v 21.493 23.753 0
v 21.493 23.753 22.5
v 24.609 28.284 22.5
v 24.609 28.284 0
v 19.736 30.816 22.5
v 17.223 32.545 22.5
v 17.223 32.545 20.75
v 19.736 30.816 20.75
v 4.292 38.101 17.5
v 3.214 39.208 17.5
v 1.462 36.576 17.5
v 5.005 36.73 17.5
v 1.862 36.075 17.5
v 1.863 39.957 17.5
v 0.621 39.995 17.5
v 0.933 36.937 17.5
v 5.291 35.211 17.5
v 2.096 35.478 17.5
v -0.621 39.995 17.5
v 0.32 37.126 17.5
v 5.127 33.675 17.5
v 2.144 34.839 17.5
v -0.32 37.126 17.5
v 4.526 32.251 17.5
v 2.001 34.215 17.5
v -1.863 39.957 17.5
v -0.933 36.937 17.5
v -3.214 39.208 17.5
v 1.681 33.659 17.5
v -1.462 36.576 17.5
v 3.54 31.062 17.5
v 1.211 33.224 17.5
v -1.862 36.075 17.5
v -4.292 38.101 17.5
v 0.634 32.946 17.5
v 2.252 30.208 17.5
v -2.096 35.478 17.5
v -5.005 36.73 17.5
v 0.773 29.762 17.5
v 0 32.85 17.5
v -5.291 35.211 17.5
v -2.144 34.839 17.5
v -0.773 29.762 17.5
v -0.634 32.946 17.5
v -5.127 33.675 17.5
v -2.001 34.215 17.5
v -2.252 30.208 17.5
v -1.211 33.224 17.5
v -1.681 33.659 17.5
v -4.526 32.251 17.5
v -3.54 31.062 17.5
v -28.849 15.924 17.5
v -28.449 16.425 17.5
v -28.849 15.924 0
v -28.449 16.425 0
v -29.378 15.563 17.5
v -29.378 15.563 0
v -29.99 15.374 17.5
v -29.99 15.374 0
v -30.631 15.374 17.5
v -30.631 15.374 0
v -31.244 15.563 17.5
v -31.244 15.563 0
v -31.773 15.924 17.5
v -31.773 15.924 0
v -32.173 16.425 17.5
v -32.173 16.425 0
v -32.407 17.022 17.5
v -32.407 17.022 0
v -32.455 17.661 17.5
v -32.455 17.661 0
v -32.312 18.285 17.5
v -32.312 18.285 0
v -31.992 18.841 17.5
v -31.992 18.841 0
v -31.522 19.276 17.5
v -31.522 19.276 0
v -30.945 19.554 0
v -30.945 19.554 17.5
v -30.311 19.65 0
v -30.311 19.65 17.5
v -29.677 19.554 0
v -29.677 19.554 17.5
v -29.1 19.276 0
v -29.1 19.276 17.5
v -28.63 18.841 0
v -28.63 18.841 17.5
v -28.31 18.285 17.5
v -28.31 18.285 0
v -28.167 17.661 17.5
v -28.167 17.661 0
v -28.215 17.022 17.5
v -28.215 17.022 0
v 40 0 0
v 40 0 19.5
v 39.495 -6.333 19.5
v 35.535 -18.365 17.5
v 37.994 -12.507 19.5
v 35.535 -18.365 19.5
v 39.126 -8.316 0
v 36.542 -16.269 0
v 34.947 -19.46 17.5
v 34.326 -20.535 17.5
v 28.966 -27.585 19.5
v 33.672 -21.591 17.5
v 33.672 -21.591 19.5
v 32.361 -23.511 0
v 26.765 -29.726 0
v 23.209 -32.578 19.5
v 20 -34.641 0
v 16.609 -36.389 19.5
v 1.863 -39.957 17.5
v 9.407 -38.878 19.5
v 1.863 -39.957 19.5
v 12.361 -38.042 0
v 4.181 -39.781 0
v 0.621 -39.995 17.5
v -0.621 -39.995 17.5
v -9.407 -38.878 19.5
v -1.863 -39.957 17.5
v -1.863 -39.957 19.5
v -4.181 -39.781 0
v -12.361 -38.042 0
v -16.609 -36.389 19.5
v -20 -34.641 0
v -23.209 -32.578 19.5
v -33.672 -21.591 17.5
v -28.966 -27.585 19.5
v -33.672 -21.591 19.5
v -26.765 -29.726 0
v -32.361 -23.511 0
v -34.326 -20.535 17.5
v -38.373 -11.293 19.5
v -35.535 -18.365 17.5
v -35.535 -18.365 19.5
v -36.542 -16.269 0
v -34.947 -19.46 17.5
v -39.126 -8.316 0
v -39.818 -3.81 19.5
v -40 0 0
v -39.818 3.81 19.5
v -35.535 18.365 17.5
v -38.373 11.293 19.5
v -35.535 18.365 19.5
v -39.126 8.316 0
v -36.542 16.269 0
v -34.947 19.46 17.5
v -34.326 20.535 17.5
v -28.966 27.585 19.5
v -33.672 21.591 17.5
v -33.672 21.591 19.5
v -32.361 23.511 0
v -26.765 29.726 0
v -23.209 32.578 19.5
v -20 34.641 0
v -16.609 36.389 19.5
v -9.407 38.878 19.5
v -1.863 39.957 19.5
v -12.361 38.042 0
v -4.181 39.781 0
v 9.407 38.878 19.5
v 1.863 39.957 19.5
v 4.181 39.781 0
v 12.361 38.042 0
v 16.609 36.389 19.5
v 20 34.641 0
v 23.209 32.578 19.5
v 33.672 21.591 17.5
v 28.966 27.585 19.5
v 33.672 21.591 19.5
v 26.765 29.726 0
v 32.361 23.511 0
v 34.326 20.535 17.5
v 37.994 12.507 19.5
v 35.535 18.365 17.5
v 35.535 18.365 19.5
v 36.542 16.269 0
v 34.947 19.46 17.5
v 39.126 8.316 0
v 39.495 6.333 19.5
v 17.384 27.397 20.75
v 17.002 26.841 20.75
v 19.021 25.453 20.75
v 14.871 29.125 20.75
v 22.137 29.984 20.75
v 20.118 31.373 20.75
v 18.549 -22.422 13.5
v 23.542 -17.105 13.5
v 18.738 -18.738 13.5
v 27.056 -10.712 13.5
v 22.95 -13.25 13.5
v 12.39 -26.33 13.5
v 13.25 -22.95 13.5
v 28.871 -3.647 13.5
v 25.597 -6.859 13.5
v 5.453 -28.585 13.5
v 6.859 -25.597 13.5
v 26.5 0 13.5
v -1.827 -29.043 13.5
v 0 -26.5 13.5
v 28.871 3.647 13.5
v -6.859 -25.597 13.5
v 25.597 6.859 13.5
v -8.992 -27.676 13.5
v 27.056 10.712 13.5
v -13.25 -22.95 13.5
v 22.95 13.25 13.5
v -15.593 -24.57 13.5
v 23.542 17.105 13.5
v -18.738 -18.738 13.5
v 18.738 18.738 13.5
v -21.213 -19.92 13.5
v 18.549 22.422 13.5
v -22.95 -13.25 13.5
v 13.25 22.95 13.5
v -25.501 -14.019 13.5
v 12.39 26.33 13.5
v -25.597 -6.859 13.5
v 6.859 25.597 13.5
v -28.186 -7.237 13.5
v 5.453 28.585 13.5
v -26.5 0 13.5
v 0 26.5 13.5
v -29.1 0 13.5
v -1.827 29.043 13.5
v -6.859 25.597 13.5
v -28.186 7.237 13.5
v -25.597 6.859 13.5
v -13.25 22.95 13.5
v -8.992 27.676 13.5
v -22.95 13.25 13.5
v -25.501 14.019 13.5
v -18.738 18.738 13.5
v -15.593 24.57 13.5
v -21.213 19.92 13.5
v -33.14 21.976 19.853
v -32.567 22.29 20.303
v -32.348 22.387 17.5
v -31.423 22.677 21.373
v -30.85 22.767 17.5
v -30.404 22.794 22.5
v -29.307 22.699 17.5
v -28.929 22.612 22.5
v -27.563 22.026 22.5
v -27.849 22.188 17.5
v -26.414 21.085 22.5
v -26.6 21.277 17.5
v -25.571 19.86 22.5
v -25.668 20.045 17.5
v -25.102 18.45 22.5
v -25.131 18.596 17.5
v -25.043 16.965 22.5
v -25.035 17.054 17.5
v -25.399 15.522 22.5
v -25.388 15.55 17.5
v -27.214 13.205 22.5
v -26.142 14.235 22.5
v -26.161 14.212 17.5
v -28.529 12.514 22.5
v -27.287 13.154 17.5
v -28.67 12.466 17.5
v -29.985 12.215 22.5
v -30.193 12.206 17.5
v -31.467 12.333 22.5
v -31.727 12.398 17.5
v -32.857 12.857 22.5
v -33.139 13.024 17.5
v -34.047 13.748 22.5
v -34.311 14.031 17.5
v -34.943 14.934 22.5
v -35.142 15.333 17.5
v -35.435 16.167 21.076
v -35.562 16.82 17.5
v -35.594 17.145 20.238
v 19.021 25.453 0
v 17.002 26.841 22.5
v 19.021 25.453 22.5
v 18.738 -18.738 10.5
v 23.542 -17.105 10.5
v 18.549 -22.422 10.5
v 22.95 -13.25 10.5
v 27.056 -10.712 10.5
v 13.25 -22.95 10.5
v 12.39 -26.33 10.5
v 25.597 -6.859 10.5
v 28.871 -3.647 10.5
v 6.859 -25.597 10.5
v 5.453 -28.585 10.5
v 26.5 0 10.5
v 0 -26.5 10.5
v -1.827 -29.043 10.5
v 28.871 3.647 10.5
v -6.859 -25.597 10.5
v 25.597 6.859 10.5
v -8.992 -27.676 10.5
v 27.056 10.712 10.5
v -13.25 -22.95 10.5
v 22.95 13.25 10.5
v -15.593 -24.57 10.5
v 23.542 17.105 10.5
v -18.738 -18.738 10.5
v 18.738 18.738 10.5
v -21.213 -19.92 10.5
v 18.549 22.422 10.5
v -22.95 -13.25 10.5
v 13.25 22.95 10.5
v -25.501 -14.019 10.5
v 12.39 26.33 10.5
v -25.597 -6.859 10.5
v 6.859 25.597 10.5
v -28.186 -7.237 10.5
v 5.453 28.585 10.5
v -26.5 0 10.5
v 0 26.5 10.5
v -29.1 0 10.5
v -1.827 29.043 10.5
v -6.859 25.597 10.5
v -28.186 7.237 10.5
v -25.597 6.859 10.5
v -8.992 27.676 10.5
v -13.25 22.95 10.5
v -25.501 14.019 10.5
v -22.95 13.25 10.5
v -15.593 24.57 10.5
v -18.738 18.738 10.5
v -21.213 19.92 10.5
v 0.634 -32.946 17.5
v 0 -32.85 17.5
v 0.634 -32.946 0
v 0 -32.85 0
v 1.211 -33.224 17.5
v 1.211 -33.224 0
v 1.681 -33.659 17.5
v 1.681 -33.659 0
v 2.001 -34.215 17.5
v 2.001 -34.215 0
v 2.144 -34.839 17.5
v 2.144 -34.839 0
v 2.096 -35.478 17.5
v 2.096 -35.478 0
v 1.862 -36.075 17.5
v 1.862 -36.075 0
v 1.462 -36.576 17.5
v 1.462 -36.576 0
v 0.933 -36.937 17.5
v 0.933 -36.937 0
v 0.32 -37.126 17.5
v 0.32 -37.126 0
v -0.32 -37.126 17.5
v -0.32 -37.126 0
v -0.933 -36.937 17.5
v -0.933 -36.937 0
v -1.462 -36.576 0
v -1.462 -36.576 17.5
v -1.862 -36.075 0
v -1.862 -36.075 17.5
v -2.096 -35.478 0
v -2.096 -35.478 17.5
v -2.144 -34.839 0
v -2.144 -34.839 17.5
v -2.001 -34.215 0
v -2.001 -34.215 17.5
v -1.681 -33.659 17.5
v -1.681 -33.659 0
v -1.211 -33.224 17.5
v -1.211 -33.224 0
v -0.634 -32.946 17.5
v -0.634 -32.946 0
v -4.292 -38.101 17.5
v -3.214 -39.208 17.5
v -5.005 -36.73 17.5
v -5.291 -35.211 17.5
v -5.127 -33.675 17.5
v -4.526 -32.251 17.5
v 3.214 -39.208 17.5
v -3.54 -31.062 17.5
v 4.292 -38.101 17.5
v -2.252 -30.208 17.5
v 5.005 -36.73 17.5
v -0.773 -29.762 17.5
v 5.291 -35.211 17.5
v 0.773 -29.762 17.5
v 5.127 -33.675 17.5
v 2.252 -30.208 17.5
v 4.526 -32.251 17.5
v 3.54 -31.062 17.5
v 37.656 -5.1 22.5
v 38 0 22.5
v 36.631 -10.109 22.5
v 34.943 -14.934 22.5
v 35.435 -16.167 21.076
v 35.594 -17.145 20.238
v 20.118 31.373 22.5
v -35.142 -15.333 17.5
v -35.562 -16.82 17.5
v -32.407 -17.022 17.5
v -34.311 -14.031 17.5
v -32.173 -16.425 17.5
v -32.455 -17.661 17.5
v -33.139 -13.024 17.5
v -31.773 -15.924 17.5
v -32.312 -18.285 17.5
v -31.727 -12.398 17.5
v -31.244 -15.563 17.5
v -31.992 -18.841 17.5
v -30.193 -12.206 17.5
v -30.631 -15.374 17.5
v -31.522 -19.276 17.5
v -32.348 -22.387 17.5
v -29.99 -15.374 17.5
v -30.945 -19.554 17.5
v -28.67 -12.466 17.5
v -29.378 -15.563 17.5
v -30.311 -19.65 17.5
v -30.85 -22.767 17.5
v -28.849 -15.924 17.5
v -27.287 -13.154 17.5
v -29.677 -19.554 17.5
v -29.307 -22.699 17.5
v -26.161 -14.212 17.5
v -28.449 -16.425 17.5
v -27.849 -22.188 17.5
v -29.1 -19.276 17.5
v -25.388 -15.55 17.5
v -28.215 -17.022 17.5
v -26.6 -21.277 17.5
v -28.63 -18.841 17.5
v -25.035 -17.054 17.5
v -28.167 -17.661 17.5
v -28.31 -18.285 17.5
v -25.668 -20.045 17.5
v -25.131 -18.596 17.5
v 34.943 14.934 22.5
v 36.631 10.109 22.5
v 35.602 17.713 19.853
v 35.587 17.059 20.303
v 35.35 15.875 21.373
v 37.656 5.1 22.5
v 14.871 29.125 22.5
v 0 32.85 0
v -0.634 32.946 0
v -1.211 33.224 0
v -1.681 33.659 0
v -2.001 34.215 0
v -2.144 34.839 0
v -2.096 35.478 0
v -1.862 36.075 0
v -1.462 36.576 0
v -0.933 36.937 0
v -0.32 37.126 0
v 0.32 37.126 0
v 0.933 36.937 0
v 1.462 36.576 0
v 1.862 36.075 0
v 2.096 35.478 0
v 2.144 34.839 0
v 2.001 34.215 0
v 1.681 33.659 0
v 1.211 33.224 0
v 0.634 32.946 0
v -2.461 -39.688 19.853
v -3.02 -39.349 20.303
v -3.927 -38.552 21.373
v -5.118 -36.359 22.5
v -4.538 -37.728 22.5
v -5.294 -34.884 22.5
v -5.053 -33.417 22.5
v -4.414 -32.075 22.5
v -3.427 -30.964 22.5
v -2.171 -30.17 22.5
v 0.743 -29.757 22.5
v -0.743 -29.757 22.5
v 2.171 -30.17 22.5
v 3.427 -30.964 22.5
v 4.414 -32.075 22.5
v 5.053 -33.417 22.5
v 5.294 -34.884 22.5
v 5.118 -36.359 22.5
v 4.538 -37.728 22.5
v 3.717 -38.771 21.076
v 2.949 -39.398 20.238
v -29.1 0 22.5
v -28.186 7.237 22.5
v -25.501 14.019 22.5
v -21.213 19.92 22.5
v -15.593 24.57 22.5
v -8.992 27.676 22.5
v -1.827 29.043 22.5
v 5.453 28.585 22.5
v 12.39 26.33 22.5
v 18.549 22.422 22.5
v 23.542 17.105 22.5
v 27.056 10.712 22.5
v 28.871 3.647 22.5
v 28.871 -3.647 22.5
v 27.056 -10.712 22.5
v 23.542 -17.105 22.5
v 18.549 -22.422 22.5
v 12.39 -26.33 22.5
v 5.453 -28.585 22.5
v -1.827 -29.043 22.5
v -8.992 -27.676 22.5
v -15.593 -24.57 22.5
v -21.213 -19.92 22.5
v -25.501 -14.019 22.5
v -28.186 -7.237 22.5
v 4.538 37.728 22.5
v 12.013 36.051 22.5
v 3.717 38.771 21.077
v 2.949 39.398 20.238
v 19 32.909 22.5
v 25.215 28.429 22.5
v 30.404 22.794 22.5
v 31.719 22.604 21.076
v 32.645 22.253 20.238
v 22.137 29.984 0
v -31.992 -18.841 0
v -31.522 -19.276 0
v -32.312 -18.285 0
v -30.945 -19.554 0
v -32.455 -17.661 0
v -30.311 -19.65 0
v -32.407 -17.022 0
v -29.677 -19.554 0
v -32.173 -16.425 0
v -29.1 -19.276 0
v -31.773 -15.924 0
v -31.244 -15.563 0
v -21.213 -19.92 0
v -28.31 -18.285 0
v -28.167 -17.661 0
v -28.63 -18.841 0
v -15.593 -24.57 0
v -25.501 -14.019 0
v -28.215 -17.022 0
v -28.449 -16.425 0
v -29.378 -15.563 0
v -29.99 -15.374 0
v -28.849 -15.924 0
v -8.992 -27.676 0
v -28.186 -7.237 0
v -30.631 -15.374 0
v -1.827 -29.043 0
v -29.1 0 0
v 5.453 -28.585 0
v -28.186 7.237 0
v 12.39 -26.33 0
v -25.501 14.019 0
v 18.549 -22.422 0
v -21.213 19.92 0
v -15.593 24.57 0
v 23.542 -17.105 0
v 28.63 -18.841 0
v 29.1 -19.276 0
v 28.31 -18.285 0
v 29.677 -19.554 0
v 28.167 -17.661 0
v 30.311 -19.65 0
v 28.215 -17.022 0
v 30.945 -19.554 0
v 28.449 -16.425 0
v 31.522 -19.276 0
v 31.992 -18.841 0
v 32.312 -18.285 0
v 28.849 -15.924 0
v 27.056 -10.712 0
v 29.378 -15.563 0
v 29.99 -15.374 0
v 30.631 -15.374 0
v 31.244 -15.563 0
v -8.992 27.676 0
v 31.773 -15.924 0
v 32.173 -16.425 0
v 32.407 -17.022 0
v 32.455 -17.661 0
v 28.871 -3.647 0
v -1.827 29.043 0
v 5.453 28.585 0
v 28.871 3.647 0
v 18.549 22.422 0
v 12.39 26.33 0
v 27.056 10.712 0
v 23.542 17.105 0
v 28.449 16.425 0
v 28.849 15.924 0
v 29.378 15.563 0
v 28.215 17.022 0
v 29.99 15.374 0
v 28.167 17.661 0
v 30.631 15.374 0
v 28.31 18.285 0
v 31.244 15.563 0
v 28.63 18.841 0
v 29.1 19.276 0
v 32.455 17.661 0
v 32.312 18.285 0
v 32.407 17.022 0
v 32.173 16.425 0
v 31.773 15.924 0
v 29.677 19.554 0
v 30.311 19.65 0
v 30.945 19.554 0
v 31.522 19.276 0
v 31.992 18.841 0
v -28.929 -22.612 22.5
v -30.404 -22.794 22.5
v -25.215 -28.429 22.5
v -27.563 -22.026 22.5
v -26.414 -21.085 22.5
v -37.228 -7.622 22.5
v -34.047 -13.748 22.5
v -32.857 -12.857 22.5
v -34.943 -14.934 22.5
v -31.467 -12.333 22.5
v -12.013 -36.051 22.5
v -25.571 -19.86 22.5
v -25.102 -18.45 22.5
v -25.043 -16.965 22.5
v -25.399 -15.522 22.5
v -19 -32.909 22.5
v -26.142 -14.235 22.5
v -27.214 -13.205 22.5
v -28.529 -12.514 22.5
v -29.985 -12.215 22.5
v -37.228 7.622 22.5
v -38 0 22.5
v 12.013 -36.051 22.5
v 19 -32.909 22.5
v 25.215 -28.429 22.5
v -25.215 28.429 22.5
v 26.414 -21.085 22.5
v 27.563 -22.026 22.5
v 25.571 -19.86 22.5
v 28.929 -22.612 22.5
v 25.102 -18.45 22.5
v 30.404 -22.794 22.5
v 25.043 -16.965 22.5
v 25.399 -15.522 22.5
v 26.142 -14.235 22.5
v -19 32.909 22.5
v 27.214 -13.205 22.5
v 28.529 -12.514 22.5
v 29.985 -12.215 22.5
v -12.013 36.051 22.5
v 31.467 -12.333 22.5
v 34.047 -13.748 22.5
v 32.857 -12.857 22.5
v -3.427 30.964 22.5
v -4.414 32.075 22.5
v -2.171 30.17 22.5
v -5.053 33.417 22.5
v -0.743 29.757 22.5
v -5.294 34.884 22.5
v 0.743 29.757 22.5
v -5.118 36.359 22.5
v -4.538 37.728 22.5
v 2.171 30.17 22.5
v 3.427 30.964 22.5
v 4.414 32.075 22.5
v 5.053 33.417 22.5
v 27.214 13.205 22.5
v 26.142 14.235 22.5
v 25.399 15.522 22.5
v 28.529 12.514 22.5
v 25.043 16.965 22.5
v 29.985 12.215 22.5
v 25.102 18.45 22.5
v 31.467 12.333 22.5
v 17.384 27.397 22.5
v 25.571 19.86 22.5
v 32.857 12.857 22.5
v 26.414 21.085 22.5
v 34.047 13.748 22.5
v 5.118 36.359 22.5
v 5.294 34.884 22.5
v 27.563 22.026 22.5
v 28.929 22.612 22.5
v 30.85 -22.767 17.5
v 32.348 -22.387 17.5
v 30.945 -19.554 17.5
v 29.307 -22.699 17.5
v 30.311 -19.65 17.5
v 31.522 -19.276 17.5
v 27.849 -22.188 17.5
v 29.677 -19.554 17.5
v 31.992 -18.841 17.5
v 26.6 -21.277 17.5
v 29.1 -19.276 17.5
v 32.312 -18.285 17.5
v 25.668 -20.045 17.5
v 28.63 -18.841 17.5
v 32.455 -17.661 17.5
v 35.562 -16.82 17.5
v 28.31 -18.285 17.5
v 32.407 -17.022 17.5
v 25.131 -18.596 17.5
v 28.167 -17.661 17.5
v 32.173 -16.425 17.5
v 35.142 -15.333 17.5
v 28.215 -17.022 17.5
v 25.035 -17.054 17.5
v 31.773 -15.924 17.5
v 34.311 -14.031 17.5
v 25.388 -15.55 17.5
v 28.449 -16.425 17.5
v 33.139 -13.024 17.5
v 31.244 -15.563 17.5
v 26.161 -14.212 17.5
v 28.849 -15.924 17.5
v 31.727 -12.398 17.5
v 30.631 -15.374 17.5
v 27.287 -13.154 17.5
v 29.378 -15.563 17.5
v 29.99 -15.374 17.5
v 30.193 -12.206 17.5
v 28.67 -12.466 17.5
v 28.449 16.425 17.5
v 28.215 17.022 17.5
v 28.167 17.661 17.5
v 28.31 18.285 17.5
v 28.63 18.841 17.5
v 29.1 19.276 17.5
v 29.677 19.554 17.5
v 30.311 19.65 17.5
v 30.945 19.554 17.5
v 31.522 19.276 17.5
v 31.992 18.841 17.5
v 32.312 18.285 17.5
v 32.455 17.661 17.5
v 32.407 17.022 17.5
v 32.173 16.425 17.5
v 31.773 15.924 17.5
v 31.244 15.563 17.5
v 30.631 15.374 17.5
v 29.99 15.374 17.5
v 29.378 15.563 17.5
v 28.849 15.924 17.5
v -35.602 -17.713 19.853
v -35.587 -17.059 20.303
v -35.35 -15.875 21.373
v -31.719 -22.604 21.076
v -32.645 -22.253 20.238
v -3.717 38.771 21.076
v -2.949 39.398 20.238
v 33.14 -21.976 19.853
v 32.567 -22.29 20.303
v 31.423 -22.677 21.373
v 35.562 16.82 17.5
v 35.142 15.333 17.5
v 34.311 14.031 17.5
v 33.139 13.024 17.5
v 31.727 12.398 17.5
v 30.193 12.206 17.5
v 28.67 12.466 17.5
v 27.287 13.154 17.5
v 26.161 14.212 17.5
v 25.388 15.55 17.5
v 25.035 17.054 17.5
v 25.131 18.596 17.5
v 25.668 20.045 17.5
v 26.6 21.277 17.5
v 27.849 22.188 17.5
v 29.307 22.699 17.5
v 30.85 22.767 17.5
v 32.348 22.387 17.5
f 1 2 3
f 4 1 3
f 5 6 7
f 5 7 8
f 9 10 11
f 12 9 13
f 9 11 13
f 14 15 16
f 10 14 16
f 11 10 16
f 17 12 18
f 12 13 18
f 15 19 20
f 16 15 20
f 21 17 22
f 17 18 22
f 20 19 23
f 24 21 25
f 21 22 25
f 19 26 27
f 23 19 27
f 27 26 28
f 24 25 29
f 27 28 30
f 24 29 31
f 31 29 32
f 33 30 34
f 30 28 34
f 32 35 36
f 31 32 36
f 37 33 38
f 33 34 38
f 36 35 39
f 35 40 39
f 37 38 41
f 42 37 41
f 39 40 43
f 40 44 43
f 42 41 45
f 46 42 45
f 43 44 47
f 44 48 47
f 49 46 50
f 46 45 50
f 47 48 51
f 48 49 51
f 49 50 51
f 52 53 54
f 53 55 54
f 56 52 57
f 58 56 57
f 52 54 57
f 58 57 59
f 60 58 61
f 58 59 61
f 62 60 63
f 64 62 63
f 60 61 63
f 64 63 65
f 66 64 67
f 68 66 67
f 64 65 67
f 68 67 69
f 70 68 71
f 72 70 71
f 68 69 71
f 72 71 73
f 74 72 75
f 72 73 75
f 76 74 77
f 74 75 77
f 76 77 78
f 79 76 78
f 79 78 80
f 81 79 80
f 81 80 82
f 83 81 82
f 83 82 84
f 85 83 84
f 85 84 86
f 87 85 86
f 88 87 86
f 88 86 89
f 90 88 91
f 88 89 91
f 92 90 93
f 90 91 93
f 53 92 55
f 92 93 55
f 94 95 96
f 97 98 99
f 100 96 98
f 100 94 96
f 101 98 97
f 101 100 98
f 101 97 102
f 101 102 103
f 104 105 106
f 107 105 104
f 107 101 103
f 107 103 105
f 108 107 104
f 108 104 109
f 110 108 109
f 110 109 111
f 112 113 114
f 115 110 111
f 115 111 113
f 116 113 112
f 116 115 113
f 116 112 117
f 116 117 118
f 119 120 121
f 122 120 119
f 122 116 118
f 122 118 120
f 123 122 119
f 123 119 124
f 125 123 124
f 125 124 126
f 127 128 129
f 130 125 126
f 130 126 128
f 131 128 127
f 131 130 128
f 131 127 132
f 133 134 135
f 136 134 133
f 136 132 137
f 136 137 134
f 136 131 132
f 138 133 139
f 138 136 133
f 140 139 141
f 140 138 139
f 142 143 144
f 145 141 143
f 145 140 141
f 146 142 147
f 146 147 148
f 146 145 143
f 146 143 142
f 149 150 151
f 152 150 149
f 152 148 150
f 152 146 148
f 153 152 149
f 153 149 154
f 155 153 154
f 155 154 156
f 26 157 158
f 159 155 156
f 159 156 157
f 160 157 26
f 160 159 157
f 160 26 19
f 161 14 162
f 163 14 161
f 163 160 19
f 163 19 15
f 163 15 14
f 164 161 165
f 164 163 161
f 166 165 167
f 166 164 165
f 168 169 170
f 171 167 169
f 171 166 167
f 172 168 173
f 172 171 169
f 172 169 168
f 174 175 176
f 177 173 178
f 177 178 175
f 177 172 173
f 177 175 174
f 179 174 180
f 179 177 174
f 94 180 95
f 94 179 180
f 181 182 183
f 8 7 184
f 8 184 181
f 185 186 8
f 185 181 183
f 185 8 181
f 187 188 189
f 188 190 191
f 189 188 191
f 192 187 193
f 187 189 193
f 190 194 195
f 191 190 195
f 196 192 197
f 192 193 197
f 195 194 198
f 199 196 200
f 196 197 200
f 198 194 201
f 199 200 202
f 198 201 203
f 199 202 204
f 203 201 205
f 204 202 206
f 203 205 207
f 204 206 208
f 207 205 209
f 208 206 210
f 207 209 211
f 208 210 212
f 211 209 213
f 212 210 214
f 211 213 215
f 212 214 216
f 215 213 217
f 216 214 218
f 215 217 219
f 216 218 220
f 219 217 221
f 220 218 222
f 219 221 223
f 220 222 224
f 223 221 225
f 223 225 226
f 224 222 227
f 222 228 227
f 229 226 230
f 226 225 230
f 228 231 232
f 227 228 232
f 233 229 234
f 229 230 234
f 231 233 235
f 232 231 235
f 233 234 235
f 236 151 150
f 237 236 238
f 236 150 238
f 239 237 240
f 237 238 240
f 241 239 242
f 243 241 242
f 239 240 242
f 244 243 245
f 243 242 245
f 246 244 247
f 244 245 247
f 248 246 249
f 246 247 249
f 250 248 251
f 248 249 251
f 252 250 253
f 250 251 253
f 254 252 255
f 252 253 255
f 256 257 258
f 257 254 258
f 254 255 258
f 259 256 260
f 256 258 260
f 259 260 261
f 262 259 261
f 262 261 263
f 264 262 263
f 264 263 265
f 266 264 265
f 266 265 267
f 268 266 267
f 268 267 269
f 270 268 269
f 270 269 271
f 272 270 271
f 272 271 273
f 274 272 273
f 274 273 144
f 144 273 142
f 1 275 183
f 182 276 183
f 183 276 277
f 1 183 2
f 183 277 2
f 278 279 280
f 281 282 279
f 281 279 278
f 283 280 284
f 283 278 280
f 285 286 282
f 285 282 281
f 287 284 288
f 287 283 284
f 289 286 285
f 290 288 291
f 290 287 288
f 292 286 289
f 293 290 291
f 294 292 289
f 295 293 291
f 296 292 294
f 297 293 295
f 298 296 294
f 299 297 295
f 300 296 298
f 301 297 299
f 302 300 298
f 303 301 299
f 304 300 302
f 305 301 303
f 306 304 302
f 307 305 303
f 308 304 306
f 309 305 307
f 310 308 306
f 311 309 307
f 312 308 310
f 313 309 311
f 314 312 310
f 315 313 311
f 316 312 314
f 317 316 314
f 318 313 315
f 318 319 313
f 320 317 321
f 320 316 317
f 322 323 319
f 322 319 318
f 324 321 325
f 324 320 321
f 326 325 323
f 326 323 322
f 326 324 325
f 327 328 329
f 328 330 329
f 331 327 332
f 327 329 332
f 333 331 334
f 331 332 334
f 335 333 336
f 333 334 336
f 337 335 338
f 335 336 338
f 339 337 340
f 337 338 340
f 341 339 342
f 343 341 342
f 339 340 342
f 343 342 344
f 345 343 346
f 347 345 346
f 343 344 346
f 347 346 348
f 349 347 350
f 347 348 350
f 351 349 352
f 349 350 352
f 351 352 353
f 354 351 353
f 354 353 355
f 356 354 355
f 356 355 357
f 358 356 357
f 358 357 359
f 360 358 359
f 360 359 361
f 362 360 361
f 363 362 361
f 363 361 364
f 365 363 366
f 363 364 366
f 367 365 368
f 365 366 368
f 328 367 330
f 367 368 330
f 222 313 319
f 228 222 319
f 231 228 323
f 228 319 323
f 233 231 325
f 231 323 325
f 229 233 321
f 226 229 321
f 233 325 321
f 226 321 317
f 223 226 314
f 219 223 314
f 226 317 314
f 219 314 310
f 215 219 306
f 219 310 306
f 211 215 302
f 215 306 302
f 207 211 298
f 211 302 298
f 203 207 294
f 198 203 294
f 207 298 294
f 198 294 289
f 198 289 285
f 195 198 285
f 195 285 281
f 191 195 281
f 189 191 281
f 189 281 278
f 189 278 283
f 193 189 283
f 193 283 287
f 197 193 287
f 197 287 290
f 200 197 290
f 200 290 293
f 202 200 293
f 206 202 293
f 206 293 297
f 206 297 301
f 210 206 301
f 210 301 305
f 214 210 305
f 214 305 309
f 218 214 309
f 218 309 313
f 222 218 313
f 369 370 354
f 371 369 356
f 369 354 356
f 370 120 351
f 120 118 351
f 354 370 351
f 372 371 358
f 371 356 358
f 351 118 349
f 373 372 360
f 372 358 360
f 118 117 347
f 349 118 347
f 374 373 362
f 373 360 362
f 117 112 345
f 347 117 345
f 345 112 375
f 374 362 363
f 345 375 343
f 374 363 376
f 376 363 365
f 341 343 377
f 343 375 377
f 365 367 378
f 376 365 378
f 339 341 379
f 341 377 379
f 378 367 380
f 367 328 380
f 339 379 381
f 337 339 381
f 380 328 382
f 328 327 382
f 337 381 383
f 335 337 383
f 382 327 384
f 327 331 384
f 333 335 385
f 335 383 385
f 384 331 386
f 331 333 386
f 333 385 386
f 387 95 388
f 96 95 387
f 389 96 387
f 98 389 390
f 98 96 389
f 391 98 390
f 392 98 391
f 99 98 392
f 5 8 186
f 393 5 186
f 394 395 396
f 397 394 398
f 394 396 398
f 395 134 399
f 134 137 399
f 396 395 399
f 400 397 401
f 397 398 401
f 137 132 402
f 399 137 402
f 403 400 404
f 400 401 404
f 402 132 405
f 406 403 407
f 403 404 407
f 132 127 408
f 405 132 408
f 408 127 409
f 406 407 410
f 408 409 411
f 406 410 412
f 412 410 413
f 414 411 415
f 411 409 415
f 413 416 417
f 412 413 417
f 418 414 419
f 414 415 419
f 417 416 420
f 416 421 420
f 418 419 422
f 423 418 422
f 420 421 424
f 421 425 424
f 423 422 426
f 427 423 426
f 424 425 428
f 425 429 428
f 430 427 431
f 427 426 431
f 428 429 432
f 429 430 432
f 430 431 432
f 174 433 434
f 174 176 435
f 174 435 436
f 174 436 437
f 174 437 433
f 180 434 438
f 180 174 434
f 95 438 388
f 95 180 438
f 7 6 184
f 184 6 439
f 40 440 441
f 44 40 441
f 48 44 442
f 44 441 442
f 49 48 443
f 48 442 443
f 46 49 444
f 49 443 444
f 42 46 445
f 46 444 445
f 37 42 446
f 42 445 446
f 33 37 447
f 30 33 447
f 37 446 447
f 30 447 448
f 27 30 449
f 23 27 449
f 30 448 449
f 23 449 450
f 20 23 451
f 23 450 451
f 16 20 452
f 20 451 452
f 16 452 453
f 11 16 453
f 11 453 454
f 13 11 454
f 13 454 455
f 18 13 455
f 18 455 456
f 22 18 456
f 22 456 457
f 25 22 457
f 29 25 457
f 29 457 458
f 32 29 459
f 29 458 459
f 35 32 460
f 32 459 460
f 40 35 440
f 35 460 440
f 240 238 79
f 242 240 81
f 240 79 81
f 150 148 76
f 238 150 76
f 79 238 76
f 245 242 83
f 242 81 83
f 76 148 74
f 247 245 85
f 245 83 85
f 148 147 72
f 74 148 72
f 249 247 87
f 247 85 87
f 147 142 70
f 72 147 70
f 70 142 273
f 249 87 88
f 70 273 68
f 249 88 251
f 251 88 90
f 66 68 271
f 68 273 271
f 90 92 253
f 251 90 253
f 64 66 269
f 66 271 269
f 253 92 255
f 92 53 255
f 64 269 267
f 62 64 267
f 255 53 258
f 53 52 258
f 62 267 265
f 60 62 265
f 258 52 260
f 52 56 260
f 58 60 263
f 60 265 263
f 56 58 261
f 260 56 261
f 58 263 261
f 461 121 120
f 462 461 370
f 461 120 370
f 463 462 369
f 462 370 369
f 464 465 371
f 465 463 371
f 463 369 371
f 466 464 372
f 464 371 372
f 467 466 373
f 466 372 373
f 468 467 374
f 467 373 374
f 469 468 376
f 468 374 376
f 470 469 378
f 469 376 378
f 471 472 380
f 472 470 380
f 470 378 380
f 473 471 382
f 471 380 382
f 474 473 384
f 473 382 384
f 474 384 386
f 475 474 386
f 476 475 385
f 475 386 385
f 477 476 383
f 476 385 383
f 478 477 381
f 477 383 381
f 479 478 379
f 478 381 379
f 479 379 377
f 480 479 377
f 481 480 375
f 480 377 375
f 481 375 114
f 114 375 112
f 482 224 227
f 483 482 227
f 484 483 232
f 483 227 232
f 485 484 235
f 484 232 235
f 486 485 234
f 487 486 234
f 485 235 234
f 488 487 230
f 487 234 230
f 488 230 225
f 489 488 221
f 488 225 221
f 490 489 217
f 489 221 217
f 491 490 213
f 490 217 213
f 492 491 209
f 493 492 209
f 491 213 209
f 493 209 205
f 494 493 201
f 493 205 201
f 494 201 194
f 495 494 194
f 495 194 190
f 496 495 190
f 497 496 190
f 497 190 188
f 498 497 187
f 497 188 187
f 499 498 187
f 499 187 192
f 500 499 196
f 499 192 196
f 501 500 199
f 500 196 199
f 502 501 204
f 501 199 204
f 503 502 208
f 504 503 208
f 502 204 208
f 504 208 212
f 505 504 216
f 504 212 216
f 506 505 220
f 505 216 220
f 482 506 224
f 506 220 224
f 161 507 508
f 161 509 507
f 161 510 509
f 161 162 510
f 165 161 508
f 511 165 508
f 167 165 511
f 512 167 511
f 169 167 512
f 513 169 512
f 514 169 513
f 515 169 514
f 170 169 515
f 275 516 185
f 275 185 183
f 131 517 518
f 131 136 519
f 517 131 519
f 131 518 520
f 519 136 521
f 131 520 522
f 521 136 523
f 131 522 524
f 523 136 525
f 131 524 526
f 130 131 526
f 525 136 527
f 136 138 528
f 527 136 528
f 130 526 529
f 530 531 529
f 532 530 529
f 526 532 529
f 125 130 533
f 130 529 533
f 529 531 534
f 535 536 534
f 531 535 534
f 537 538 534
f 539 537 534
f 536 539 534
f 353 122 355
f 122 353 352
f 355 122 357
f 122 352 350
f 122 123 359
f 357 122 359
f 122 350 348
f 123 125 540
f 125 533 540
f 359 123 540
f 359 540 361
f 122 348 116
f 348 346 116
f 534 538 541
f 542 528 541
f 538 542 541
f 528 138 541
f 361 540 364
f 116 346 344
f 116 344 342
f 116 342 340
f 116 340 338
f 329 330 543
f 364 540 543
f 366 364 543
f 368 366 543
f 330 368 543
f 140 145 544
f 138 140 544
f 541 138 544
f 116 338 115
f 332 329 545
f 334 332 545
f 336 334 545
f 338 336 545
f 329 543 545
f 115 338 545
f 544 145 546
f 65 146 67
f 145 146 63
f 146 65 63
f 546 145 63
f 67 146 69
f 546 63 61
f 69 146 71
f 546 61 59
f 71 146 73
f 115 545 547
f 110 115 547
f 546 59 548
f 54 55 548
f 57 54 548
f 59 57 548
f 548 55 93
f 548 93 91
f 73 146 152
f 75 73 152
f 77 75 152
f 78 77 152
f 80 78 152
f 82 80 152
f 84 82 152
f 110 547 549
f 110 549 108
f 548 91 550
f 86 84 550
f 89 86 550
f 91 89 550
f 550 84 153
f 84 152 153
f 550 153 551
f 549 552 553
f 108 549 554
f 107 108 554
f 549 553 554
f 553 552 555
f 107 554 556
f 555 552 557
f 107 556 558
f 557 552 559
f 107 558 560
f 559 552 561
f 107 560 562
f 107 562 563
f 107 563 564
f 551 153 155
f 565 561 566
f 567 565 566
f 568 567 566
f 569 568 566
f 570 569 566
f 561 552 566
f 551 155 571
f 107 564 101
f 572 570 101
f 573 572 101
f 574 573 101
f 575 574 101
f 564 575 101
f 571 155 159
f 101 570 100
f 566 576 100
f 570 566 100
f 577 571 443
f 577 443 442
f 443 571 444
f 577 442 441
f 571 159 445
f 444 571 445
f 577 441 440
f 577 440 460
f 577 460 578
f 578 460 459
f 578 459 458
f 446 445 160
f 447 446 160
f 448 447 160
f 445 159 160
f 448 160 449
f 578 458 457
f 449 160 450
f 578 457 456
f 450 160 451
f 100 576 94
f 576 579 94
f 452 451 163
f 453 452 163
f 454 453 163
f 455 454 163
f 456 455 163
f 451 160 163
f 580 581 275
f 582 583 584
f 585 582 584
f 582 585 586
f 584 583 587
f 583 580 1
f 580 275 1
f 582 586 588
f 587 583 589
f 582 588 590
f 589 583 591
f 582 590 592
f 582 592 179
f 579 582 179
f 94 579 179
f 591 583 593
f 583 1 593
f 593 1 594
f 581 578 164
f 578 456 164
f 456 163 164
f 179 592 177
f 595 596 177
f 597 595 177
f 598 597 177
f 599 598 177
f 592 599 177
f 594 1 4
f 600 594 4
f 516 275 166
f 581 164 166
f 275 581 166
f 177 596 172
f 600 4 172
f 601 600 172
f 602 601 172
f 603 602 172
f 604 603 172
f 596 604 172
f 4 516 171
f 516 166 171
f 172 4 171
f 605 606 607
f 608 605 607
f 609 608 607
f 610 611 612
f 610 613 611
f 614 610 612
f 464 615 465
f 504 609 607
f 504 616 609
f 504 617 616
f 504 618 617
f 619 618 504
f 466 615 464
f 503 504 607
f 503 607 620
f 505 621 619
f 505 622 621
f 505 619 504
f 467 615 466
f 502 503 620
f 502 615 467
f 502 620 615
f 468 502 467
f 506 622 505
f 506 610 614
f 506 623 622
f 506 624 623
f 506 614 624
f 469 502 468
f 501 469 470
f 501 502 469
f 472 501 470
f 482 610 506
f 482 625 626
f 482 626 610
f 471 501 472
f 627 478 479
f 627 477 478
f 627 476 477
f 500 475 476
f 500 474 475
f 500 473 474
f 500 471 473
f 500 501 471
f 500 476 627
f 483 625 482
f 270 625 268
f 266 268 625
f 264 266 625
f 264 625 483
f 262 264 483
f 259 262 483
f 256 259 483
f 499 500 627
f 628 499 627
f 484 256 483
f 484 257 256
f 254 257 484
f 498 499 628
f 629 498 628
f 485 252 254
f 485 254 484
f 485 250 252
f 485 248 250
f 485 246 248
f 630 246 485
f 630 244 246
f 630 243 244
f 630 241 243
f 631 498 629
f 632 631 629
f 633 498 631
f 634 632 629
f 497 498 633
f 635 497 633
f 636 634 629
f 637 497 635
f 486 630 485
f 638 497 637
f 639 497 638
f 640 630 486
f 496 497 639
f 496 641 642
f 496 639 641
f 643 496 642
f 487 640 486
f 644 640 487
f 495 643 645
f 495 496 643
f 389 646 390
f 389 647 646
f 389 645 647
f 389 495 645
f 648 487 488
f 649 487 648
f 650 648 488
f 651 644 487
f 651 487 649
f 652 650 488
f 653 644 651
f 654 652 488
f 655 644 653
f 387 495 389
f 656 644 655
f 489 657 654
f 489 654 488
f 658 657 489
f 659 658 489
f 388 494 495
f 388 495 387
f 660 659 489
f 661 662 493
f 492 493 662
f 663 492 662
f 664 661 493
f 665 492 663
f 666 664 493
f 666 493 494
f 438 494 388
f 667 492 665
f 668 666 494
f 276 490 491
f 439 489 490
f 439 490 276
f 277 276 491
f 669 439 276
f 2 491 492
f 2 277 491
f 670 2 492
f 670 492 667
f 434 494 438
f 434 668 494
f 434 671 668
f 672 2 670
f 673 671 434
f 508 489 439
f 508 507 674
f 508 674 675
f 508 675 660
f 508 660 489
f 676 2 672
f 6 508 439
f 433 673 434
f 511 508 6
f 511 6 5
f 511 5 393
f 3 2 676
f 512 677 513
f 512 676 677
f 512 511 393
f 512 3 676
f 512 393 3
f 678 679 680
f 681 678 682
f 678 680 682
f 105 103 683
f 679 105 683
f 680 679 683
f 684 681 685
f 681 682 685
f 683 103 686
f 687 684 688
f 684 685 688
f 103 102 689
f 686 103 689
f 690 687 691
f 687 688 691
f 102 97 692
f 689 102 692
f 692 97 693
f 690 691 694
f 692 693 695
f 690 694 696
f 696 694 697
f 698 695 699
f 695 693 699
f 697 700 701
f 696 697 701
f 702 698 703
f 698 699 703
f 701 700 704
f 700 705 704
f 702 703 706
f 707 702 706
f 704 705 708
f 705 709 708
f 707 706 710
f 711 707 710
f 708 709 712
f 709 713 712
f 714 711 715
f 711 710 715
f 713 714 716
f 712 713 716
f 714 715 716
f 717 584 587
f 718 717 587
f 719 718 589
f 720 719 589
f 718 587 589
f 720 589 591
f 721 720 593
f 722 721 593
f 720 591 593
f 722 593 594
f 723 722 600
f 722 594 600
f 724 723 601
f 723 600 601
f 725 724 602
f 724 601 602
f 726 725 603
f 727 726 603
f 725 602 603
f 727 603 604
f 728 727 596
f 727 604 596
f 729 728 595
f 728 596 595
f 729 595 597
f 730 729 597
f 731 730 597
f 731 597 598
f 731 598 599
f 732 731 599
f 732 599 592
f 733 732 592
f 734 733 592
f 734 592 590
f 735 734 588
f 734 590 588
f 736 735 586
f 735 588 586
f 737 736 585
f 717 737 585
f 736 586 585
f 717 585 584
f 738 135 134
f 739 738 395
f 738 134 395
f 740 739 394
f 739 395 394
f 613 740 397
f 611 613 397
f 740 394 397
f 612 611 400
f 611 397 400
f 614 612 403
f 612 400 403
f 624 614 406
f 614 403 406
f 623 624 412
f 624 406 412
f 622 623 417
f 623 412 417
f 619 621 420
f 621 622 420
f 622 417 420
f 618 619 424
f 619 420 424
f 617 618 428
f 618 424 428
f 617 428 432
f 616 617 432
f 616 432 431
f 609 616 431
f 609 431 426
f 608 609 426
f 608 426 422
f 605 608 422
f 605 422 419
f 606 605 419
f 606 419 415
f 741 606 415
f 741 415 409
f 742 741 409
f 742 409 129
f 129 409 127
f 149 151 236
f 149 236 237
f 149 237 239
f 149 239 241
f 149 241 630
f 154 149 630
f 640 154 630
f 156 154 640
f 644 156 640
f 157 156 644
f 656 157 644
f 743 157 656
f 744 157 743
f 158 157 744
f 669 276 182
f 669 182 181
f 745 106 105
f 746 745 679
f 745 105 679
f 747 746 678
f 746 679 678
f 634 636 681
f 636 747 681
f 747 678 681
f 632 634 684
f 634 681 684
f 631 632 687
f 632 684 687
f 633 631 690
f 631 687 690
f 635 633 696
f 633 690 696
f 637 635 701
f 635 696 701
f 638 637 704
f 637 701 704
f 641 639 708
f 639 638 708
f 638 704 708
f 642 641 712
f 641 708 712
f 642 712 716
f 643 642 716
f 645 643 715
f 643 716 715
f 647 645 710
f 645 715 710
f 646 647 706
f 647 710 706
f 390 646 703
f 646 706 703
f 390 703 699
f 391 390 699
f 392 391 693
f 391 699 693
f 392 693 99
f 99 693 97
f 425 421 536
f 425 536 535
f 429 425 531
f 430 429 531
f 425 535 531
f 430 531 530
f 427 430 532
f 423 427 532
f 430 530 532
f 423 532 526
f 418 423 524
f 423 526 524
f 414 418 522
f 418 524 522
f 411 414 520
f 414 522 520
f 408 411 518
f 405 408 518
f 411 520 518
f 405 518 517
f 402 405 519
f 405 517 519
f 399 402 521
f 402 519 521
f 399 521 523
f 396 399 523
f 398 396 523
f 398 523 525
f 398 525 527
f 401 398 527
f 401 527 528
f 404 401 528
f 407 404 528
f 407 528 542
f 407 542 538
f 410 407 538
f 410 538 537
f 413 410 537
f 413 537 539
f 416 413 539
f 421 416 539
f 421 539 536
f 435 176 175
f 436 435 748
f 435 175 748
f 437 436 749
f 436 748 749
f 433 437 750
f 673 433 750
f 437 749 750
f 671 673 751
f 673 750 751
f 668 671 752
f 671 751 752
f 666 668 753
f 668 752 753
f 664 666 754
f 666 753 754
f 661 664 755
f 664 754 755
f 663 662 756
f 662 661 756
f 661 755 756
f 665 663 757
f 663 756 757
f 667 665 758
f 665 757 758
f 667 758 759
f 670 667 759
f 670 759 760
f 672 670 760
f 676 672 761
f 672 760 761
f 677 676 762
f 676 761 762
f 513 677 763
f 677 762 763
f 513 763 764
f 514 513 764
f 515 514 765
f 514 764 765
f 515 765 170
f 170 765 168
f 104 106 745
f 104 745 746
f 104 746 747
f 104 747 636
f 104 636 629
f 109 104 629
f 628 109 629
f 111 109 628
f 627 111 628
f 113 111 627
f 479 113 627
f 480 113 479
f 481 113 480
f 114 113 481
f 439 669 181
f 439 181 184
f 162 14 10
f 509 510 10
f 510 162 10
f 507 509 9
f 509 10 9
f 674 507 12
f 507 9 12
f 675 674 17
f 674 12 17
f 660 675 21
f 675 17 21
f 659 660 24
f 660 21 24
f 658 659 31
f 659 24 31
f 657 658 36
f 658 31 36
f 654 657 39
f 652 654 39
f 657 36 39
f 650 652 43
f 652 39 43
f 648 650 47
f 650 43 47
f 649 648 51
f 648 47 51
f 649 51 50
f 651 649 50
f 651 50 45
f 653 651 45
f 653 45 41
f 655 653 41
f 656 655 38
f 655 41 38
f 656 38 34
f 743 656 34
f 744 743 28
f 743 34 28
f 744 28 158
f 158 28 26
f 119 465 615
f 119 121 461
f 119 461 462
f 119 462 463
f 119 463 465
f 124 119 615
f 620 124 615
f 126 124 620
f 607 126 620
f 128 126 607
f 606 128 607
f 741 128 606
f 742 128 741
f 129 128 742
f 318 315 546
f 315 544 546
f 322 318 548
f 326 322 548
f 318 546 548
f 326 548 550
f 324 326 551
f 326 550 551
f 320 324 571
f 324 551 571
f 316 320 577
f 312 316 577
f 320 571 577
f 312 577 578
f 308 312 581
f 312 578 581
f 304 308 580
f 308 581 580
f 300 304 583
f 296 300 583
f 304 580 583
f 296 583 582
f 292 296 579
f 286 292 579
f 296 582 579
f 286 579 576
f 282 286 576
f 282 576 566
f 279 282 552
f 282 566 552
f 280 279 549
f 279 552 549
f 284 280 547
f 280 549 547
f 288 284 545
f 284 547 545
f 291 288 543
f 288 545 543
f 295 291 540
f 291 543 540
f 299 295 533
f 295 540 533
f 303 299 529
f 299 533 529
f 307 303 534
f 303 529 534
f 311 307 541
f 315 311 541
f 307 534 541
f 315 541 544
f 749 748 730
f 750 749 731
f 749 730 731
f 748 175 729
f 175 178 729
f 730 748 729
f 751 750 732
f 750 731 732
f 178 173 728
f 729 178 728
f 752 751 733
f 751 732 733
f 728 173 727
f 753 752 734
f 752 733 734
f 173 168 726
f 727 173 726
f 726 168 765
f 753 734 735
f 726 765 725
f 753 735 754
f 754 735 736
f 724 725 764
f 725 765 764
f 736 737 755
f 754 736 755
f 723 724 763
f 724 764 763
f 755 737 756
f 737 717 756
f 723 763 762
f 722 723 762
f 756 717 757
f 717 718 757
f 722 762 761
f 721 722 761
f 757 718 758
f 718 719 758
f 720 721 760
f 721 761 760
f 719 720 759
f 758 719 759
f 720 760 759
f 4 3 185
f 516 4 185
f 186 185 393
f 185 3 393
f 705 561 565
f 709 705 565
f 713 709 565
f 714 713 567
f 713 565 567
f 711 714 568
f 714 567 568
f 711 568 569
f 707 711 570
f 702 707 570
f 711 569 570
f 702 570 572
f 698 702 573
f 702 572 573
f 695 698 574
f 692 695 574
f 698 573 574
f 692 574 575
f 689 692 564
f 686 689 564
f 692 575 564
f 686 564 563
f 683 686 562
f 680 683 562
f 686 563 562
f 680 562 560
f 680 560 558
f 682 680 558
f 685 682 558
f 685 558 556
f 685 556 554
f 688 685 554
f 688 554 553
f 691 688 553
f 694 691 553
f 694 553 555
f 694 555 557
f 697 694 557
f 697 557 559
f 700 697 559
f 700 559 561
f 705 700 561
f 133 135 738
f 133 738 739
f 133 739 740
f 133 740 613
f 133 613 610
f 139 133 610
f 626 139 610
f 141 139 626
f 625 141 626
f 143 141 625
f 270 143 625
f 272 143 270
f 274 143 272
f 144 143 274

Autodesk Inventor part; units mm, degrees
ref_plane "YZ Plane" through (0, 0, 0) normal (1, 0, 0) x (0, 1, 0)
ref_plane "XZ Plane" through (0, 0, 0) normal (0, 1, 0) x (-1, 0, 0)
ref_plane "XY Plane" through (0, 0, 0) normal (0, 0, 1) x (1, 0, 0)
sketch "Sketch1" plane through (0, 0, 0) normal (0, 0, 1) x (1, 0, 0)
  circle A0 centre (0, 0) radius 40
  dimension "d0" = 80
extrude "Extrusion1" add sketch "Sketch1" along normal blind 22.5
sketch "Sketch2" plane through (0, 0, 22.5) normal (0, 0, 1) x (1, 0, 0)
  point P0 (0, 0)
  point P1 (0, 35)
  dimension "d3" = 35
hole "Hole1" at (0, 35, 22.5) direction (0, 0, -1) diameter 4.3 end through all counterbore diameter 10.59 counterbore depth 5 clearance for "Hex Head Machine Screw" size "M4" standard "Ansi Metric M Profile"
chamfer "Chamfer1" distance 2 distance2 3 2 edges at (-27.6179, -28.9353, 22.5) (28.9353, 27.6179, 22.5) measured on face at (-2.7418, -16.4668, 22.5)
pattern_circular "Circular Pattern1" count 6 over 360 about axis through (0, 0, 0) along (0, 0, 1) of "Hole1"
sketch "Sketch3" plane through (0, 0, 0) normal (0, 0, -1) x (-1, 0, 0)
  circle A0 centre (0, 0) radius 29.1
  dimension "d17" = 58.2
extrude "Extrusion2" cut sketch "Sketch3" against normal through all
ref_plane "Work Plane1" through (0, 0, 10.5) normal (0, 0, -1) x (-1, 0, 0)
sketch "Sketch4" plane through (0, 0, 10.5) normal (0, 0, -1) x (-1, 0, 0)
  circle A0 centre (0, 0) radius 29.5
  circle A1 centre (0, 0) radius 26.5
  dimension "d21" = 53
  dimension "d22" = 59
extrude "Extrusion3" add sketch "Sketch4" against normal blind 3
sketch "Sketch5" plane through (0, 0, 22.5) normal (0, 0, 1) x (1, 0, 0)
  arc A0 (33.6722, 21.5913) -> (1.8625, 39.9566) centre (0, 0) ccw projected
  line L0 (0, 0) -> (40, 0) construction
  line L1 (21.4926, 23.7527) -> (24.6091, 28.2845)
  line L2 (24.6091, 28.2845) -> (17.6054, 33.101)
  line L3 (17.6054, 33.101) -> (14.4889, 28.5691)
  line L4 (14.4889, 28.5691) -> (21.4926, 23.7527)
  line L5 (21.4926, 23.7527) -> (17.6054, 33.101) construction
  line L6 (24.6091, 28.2845) -> (14.4889, 28.5691) construction
  line L7 (17.002, 26.8409) -> (20.1185, 31.3727)
  line L8 (22.1372, 29.9845) -> (19.0207, 25.4526)
  line L9 (14.8714, 29.1253) -> (17.223, 32.5448)
  line L10 (17.223, 32.5448) -> (19.736, 30.8165)
  line L11 (19.736, 30.8165) -> (17.3845, 27.3971)
  line L12 (17.3845, 27.3971) -> (14.8714, 29.1253)
  line L13 (19.549, 28.4268) -> (16.0472, 30.8351)
  line L14 (17.3845, 27.3971) -> (17.223, 32.5448)
  line L15 (14.8714, 29.1253) -> (19.736, 30.8165)
  line L16 (0, 0) -> (17.3037, 29.9709)
  line L17 (0, 0) -> (19.549, 28.4268)
  dimension "d26" = 8.5
  dimension "d27" = 5.5
  dimension "d29" = 34.5
  dimension "d30" = 3.05
  dimension "d36" = 3
  dimension "d41" = 4.15
  dimension "d42" = 60
extrude "Extrusion4" cut sketch "Sketch5" against normal blind 1.75 contours L4 L17 L13 L7 L2 L8 | L4 L7 L13 L17 | L15 L14 L10 | L7 L13 L15 | L14 L13 L7 | L12 L16 L14 | L14 L13 L3 | L15 L3 L13 | L16 L12 L15
extrude "Extrusion7" cut sketch "Sketch5" against normal through all contours L4 L8 L2 L1
properties part number "Ring Cover Top"
